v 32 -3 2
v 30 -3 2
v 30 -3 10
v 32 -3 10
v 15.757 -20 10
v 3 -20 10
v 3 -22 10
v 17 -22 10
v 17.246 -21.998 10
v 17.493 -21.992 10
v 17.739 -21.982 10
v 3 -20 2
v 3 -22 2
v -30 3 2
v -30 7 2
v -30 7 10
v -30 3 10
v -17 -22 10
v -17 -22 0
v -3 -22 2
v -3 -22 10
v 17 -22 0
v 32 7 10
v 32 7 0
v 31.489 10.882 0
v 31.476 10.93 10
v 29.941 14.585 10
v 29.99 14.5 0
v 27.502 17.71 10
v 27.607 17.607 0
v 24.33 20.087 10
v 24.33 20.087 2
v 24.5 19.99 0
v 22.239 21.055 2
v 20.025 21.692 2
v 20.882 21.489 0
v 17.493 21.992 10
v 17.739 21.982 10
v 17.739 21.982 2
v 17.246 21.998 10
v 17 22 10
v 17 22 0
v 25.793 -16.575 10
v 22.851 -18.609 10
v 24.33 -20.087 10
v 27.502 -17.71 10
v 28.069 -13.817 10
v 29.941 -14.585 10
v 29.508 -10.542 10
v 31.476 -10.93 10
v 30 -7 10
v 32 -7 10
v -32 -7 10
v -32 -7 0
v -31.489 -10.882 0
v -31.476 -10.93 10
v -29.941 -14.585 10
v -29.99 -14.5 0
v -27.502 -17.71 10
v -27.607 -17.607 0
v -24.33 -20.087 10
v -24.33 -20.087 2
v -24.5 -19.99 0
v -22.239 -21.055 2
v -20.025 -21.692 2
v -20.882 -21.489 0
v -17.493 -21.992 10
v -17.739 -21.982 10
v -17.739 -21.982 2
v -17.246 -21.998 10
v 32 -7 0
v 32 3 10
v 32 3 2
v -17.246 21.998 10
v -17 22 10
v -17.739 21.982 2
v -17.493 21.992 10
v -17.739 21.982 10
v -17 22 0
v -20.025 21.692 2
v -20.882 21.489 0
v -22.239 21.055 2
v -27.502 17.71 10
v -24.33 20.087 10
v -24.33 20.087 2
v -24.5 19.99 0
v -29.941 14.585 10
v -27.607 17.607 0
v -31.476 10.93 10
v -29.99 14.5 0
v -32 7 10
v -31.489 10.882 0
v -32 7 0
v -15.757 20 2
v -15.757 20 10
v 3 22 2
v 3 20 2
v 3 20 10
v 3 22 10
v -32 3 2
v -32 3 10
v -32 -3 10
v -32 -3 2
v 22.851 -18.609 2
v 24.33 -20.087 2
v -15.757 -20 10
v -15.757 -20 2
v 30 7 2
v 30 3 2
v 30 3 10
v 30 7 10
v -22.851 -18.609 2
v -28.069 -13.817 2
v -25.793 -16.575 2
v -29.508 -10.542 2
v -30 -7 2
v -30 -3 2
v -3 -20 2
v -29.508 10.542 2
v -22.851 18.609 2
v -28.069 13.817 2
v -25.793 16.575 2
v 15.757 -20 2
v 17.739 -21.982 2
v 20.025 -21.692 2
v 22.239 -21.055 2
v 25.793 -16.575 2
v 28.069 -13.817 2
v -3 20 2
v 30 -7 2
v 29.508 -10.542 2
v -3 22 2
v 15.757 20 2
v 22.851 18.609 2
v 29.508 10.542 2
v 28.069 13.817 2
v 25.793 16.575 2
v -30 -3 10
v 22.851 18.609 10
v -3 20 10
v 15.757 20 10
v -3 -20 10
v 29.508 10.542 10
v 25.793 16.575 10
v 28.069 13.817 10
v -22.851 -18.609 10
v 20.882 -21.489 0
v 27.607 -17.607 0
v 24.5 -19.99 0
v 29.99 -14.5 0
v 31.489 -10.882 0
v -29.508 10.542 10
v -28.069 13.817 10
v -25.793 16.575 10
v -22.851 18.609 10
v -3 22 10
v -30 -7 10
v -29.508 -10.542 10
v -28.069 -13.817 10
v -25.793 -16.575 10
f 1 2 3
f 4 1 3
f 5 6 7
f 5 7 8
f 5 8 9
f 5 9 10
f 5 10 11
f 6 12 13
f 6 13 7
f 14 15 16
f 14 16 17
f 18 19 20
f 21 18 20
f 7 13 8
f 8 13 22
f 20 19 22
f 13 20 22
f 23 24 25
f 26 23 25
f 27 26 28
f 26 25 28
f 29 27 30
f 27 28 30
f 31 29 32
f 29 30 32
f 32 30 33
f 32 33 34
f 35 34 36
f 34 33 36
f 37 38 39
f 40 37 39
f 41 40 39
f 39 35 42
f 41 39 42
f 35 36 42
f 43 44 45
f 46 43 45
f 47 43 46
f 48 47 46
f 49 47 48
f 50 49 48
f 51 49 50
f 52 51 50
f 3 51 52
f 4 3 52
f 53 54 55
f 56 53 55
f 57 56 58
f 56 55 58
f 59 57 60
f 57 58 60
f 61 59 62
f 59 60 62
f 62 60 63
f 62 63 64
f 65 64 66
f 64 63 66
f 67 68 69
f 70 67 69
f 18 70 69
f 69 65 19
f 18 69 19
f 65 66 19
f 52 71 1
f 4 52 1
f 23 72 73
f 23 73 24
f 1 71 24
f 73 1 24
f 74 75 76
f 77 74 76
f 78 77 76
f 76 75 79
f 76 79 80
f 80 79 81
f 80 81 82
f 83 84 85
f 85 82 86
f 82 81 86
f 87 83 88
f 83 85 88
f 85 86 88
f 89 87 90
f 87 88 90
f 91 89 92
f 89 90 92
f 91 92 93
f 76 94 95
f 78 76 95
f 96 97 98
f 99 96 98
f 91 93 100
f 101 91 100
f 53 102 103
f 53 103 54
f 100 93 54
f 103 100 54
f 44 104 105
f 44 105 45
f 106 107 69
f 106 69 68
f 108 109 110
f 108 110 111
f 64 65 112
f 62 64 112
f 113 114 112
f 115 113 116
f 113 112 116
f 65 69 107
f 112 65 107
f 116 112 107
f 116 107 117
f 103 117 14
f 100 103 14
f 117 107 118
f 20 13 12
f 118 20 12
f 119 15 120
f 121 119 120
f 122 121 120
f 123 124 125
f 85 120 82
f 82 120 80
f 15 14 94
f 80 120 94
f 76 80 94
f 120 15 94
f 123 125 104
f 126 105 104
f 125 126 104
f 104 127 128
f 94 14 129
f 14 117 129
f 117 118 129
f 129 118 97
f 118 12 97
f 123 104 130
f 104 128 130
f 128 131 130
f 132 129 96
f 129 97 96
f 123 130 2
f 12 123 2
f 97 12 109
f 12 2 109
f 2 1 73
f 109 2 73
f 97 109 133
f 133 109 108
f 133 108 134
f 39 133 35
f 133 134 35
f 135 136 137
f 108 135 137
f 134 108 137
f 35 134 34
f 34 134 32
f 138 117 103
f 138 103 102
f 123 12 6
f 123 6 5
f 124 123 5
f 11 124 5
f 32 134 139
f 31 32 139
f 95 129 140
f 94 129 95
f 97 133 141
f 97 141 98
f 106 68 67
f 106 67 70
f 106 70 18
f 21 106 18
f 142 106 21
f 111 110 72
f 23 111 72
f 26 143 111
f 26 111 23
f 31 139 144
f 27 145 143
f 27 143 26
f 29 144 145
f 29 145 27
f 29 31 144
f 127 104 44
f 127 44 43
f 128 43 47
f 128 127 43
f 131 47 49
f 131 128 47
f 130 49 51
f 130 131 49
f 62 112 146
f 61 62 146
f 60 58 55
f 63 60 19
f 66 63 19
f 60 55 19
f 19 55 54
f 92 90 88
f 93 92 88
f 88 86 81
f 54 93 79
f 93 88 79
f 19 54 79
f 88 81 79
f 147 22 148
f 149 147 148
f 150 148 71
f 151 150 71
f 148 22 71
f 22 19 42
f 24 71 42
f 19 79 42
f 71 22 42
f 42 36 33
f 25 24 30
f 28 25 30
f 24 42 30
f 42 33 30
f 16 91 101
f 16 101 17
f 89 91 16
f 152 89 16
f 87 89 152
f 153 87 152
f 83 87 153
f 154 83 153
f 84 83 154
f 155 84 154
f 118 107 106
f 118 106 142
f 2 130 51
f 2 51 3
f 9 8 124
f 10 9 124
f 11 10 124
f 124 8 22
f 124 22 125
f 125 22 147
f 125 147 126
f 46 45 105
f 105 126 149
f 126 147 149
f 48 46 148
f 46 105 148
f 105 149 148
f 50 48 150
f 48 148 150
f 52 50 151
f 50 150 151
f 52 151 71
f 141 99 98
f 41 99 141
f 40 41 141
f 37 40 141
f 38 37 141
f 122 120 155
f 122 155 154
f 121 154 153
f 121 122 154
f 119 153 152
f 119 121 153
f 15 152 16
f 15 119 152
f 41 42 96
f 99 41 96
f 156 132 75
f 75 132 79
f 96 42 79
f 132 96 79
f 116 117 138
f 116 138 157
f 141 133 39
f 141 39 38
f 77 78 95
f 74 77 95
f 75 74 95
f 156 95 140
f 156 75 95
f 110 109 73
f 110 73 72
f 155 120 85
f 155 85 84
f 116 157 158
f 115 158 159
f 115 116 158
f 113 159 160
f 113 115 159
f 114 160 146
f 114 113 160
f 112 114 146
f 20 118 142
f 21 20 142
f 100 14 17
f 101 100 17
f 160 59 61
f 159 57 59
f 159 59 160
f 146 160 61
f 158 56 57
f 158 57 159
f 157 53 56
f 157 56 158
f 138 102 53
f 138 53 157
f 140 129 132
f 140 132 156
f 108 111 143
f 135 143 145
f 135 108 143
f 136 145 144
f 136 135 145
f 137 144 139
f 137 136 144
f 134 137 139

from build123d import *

# Parameters (mm, degrees)
PAD_DEPTH          = 10
SKETCH002_W        = 6
SKETCH002_H        = 8
POCKET_DEPTH       = 178.615176
POLARPATTERN_COUNT = 8
PAD001_DEPTH       = 2


with BuildPart() as part:
    # Sketch → Pad (new body)
    with BuildSketch(Plane.XY):
        with BuildLine():
            Line((-32, 7), (-32, -7))
            ThreePointArc((-32, -7), (-27.606602, -17.606602), (-17, -22))
            Line((-17, -22), (17, -22))
            ThreePointArc((17, -22), (27.606602, -17.606602), (32, -7))
            Line((32, -7), (32, 7))
            ThreePointArc((32, 7), (27.606602, 17.606602), (17, 22))
            Line((17, 22), (-17, 22))
            ThreePointArc((-17, 22), (-27.606602, 17.606602), (-32, 7))
        make_face()
        with BuildLine():
            Line((-30, 7), (-30, -7))
            ThreePointArc((-30, -7), (-26.192388, -16.192388), (-17, -20))
            Line((-17, -20), (17, -20))
            ThreePointArc((17, -20), (26.192388, -16.192388), (30, -7))
            Line((30, -7), (30, 7))
            ThreePointArc((30, 7), (26.192388, 16.192388), (17, 20))
            Line((17, 20), (-17, 20))
            ThreePointArc((-17, 20), (-26.192388, 16.192388), (-30, 7))
        make_face(mode=Mode.SUBTRACT)
    extrude(amount=PAD_DEPTH)

    # Sketch002 → Pocket (cut, through all)
    with BuildSketch(Plane.XZ):
        with Locations((0, 6)):
            Rectangle(SKETCH002_W, SKETCH002_H)
    pocket = extrude(amount=-POCKET_DEPTH, mode=Mode.SUBTRACT)

    # PolarPattern: Pocket ×8 about axis
    polarpattern_axis = Axis((0, 0, 0), (0, 0, 1))
    for i in range(1, POLARPATTERN_COUNT):
        add(pocket.rotate(polarpattern_axis, i * 360 / POLARPATTERN_COUNT), mode=Mode.SUBTRACT)

    # Sketch001 → Pad001 (join)
    with BuildSketch(Plane.XY):
        with BuildLine():
            Line((-31, 6), (-31, -6))
            ThreePointArc((-31, -6), (-26.606602, -16.606602), (-16, -21))
            Line((-16, -21), (16, -21))
            ThreePointArc((16, -21), (26.606602, -16.606602), (31, -6))
            Line((31, -6), (31, 6))
            ThreePointArc((31, 6), (26.606602, 16.606602), (16, 21))
            Line((16, 21), (-16, 21))
            ThreePointArc((-16, 21), (-26.606602, 16.606602), (-31, 6))
        make_face()
    extrude(amount=PAD001_DEPTH)


solid = part.part
